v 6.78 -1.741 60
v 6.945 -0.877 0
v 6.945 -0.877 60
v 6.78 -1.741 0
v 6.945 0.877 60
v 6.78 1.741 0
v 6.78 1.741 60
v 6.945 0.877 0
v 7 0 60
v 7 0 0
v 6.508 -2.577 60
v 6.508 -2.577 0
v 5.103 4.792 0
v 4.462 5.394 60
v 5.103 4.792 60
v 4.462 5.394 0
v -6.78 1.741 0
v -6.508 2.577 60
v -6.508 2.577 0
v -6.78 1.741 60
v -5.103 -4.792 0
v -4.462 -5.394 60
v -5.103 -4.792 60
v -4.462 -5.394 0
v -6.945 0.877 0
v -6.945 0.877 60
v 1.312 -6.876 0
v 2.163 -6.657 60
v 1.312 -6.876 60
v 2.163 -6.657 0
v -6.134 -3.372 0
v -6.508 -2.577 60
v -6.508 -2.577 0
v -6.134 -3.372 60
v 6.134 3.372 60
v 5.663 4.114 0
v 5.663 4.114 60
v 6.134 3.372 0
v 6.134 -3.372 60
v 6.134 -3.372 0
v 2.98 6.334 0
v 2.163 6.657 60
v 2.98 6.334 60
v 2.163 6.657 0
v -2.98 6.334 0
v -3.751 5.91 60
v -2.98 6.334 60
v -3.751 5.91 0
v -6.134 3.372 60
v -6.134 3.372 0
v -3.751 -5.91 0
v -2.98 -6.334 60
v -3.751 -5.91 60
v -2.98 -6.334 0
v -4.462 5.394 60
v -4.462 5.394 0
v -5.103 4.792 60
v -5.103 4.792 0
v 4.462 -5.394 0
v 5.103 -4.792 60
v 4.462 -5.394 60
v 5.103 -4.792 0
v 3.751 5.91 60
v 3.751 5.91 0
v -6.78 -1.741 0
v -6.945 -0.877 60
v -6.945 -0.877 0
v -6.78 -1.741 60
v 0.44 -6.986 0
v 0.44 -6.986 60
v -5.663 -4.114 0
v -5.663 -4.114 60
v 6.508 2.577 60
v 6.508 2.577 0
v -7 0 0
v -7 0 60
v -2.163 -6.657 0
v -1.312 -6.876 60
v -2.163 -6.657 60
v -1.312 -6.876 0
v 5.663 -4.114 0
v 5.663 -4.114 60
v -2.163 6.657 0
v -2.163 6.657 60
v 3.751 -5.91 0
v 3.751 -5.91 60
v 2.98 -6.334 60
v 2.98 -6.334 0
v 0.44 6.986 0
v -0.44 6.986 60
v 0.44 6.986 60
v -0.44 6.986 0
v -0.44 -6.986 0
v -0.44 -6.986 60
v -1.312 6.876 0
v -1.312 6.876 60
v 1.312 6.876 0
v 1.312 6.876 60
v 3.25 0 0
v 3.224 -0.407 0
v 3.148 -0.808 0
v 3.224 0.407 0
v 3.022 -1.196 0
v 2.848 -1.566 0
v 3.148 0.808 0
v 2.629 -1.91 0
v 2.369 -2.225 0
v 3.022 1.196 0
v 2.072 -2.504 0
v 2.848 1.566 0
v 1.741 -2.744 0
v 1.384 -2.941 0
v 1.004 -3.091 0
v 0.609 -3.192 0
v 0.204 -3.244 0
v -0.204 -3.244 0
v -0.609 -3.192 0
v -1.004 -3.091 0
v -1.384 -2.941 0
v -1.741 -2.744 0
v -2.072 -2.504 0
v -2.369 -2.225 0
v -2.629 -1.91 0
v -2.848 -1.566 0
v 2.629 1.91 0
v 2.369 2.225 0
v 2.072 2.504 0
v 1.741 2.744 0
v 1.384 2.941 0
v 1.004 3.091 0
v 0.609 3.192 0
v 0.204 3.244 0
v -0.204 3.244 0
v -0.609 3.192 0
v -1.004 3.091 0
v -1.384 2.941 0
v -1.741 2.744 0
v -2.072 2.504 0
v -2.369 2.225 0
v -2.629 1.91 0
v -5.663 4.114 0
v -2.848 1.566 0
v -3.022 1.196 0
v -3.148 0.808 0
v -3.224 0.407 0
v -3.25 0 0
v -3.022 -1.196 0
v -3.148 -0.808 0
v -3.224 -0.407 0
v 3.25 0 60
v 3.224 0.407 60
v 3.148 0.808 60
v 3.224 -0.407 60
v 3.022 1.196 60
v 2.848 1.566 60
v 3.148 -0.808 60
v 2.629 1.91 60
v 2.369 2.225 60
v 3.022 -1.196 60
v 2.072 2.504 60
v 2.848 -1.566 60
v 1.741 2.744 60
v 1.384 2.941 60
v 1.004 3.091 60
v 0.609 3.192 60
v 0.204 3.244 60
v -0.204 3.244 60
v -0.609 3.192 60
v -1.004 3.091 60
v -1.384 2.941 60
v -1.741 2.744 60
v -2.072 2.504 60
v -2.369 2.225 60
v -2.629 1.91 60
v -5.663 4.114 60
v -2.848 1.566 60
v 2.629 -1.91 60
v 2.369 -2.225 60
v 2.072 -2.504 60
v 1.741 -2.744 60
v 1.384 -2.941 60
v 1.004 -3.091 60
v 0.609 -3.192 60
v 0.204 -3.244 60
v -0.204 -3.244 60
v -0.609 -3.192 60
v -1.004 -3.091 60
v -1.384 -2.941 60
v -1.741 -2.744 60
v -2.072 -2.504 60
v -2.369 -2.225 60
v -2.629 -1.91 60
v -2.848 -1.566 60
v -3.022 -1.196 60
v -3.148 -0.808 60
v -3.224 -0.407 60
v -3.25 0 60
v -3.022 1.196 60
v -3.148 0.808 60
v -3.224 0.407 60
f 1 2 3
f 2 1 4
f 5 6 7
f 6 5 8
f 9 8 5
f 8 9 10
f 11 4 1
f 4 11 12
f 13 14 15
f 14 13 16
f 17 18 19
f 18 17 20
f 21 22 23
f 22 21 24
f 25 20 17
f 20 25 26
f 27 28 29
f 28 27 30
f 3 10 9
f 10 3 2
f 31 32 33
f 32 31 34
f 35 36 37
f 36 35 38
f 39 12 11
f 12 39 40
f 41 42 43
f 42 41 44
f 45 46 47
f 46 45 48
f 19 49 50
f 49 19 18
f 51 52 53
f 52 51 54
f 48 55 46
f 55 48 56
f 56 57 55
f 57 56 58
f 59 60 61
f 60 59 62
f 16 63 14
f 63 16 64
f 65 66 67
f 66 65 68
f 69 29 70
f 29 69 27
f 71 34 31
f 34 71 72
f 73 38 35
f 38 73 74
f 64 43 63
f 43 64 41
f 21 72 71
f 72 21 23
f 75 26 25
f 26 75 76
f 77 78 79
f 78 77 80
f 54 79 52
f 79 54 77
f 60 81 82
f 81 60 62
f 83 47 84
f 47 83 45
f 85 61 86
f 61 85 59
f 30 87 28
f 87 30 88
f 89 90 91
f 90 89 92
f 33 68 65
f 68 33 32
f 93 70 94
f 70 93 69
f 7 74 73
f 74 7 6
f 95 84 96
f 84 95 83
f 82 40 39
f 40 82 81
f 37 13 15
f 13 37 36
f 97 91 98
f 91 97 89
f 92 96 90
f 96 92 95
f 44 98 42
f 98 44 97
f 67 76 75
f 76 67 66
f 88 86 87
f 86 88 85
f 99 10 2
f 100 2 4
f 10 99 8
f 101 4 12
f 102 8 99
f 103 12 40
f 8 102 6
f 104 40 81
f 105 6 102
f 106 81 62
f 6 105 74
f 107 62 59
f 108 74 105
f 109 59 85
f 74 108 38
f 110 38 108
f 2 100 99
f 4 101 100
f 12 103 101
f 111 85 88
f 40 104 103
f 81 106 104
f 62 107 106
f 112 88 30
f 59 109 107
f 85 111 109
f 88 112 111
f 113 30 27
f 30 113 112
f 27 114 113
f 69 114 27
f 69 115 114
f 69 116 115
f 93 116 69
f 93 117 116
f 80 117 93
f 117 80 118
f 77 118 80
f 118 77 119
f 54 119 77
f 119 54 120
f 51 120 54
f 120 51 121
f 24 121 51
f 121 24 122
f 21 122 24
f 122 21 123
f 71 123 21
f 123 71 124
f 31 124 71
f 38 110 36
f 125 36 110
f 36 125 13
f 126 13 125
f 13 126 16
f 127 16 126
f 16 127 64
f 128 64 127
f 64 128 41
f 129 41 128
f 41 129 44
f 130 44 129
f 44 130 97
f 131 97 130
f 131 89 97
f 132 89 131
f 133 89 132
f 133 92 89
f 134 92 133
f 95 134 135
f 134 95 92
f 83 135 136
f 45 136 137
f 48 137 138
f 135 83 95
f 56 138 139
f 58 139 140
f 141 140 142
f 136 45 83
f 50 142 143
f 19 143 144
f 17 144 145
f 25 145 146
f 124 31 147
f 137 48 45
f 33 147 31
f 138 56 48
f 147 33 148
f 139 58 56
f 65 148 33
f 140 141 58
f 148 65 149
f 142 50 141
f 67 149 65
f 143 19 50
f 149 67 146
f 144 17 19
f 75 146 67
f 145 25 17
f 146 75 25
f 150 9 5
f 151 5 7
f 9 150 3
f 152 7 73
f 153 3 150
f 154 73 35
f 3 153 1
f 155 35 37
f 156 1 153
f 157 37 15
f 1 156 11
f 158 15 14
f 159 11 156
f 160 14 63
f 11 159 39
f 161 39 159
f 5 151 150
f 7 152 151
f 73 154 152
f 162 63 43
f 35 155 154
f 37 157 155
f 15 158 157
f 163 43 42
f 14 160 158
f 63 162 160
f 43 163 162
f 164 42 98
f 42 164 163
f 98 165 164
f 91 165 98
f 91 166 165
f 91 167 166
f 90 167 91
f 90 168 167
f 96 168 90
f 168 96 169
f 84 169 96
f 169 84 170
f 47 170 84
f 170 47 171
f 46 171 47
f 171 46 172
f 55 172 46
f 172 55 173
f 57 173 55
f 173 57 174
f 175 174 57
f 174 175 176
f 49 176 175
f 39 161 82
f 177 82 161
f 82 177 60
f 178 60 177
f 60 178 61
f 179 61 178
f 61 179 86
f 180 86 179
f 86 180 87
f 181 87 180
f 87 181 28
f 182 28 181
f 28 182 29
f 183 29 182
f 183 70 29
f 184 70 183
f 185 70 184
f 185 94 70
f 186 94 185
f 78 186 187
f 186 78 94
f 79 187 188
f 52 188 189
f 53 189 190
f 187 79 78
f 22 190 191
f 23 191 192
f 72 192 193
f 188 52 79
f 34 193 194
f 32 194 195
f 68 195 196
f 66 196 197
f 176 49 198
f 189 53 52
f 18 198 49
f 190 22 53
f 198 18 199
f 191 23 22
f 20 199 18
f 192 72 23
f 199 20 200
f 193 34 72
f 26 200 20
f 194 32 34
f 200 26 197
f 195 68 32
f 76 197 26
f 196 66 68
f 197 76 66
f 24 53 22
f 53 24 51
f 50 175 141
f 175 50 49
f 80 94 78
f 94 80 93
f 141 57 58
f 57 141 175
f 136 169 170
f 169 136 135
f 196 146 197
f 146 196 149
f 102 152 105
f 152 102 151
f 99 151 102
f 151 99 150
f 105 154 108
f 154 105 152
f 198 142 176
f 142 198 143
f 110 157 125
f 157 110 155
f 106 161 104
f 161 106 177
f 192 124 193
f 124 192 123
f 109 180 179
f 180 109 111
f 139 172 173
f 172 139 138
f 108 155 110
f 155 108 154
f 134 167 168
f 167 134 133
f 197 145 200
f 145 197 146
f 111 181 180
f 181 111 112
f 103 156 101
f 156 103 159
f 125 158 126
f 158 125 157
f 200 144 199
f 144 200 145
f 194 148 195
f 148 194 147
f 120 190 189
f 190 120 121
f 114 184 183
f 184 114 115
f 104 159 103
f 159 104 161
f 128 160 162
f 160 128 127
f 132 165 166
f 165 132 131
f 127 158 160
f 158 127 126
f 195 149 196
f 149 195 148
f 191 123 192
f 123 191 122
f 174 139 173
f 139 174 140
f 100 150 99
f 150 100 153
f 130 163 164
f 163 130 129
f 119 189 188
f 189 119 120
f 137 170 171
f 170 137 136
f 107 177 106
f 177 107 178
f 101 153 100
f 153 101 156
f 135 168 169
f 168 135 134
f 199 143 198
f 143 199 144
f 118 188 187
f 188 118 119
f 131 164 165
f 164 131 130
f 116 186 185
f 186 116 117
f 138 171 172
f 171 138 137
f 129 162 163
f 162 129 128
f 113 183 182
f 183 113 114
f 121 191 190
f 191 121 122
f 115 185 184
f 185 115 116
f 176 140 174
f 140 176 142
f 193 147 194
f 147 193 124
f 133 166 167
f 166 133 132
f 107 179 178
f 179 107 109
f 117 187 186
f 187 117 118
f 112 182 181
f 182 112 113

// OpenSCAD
$fn = 50;


difference() {
	union() {
		cylinder(h = 60, r = 7.0000000000);
	}
	union() {
		translate(v = [0.0000000000, 0.0000000000, -100.0000000000]) {
			cylinder(h = 200, r = 3.2500000000);
		}
	}
}
